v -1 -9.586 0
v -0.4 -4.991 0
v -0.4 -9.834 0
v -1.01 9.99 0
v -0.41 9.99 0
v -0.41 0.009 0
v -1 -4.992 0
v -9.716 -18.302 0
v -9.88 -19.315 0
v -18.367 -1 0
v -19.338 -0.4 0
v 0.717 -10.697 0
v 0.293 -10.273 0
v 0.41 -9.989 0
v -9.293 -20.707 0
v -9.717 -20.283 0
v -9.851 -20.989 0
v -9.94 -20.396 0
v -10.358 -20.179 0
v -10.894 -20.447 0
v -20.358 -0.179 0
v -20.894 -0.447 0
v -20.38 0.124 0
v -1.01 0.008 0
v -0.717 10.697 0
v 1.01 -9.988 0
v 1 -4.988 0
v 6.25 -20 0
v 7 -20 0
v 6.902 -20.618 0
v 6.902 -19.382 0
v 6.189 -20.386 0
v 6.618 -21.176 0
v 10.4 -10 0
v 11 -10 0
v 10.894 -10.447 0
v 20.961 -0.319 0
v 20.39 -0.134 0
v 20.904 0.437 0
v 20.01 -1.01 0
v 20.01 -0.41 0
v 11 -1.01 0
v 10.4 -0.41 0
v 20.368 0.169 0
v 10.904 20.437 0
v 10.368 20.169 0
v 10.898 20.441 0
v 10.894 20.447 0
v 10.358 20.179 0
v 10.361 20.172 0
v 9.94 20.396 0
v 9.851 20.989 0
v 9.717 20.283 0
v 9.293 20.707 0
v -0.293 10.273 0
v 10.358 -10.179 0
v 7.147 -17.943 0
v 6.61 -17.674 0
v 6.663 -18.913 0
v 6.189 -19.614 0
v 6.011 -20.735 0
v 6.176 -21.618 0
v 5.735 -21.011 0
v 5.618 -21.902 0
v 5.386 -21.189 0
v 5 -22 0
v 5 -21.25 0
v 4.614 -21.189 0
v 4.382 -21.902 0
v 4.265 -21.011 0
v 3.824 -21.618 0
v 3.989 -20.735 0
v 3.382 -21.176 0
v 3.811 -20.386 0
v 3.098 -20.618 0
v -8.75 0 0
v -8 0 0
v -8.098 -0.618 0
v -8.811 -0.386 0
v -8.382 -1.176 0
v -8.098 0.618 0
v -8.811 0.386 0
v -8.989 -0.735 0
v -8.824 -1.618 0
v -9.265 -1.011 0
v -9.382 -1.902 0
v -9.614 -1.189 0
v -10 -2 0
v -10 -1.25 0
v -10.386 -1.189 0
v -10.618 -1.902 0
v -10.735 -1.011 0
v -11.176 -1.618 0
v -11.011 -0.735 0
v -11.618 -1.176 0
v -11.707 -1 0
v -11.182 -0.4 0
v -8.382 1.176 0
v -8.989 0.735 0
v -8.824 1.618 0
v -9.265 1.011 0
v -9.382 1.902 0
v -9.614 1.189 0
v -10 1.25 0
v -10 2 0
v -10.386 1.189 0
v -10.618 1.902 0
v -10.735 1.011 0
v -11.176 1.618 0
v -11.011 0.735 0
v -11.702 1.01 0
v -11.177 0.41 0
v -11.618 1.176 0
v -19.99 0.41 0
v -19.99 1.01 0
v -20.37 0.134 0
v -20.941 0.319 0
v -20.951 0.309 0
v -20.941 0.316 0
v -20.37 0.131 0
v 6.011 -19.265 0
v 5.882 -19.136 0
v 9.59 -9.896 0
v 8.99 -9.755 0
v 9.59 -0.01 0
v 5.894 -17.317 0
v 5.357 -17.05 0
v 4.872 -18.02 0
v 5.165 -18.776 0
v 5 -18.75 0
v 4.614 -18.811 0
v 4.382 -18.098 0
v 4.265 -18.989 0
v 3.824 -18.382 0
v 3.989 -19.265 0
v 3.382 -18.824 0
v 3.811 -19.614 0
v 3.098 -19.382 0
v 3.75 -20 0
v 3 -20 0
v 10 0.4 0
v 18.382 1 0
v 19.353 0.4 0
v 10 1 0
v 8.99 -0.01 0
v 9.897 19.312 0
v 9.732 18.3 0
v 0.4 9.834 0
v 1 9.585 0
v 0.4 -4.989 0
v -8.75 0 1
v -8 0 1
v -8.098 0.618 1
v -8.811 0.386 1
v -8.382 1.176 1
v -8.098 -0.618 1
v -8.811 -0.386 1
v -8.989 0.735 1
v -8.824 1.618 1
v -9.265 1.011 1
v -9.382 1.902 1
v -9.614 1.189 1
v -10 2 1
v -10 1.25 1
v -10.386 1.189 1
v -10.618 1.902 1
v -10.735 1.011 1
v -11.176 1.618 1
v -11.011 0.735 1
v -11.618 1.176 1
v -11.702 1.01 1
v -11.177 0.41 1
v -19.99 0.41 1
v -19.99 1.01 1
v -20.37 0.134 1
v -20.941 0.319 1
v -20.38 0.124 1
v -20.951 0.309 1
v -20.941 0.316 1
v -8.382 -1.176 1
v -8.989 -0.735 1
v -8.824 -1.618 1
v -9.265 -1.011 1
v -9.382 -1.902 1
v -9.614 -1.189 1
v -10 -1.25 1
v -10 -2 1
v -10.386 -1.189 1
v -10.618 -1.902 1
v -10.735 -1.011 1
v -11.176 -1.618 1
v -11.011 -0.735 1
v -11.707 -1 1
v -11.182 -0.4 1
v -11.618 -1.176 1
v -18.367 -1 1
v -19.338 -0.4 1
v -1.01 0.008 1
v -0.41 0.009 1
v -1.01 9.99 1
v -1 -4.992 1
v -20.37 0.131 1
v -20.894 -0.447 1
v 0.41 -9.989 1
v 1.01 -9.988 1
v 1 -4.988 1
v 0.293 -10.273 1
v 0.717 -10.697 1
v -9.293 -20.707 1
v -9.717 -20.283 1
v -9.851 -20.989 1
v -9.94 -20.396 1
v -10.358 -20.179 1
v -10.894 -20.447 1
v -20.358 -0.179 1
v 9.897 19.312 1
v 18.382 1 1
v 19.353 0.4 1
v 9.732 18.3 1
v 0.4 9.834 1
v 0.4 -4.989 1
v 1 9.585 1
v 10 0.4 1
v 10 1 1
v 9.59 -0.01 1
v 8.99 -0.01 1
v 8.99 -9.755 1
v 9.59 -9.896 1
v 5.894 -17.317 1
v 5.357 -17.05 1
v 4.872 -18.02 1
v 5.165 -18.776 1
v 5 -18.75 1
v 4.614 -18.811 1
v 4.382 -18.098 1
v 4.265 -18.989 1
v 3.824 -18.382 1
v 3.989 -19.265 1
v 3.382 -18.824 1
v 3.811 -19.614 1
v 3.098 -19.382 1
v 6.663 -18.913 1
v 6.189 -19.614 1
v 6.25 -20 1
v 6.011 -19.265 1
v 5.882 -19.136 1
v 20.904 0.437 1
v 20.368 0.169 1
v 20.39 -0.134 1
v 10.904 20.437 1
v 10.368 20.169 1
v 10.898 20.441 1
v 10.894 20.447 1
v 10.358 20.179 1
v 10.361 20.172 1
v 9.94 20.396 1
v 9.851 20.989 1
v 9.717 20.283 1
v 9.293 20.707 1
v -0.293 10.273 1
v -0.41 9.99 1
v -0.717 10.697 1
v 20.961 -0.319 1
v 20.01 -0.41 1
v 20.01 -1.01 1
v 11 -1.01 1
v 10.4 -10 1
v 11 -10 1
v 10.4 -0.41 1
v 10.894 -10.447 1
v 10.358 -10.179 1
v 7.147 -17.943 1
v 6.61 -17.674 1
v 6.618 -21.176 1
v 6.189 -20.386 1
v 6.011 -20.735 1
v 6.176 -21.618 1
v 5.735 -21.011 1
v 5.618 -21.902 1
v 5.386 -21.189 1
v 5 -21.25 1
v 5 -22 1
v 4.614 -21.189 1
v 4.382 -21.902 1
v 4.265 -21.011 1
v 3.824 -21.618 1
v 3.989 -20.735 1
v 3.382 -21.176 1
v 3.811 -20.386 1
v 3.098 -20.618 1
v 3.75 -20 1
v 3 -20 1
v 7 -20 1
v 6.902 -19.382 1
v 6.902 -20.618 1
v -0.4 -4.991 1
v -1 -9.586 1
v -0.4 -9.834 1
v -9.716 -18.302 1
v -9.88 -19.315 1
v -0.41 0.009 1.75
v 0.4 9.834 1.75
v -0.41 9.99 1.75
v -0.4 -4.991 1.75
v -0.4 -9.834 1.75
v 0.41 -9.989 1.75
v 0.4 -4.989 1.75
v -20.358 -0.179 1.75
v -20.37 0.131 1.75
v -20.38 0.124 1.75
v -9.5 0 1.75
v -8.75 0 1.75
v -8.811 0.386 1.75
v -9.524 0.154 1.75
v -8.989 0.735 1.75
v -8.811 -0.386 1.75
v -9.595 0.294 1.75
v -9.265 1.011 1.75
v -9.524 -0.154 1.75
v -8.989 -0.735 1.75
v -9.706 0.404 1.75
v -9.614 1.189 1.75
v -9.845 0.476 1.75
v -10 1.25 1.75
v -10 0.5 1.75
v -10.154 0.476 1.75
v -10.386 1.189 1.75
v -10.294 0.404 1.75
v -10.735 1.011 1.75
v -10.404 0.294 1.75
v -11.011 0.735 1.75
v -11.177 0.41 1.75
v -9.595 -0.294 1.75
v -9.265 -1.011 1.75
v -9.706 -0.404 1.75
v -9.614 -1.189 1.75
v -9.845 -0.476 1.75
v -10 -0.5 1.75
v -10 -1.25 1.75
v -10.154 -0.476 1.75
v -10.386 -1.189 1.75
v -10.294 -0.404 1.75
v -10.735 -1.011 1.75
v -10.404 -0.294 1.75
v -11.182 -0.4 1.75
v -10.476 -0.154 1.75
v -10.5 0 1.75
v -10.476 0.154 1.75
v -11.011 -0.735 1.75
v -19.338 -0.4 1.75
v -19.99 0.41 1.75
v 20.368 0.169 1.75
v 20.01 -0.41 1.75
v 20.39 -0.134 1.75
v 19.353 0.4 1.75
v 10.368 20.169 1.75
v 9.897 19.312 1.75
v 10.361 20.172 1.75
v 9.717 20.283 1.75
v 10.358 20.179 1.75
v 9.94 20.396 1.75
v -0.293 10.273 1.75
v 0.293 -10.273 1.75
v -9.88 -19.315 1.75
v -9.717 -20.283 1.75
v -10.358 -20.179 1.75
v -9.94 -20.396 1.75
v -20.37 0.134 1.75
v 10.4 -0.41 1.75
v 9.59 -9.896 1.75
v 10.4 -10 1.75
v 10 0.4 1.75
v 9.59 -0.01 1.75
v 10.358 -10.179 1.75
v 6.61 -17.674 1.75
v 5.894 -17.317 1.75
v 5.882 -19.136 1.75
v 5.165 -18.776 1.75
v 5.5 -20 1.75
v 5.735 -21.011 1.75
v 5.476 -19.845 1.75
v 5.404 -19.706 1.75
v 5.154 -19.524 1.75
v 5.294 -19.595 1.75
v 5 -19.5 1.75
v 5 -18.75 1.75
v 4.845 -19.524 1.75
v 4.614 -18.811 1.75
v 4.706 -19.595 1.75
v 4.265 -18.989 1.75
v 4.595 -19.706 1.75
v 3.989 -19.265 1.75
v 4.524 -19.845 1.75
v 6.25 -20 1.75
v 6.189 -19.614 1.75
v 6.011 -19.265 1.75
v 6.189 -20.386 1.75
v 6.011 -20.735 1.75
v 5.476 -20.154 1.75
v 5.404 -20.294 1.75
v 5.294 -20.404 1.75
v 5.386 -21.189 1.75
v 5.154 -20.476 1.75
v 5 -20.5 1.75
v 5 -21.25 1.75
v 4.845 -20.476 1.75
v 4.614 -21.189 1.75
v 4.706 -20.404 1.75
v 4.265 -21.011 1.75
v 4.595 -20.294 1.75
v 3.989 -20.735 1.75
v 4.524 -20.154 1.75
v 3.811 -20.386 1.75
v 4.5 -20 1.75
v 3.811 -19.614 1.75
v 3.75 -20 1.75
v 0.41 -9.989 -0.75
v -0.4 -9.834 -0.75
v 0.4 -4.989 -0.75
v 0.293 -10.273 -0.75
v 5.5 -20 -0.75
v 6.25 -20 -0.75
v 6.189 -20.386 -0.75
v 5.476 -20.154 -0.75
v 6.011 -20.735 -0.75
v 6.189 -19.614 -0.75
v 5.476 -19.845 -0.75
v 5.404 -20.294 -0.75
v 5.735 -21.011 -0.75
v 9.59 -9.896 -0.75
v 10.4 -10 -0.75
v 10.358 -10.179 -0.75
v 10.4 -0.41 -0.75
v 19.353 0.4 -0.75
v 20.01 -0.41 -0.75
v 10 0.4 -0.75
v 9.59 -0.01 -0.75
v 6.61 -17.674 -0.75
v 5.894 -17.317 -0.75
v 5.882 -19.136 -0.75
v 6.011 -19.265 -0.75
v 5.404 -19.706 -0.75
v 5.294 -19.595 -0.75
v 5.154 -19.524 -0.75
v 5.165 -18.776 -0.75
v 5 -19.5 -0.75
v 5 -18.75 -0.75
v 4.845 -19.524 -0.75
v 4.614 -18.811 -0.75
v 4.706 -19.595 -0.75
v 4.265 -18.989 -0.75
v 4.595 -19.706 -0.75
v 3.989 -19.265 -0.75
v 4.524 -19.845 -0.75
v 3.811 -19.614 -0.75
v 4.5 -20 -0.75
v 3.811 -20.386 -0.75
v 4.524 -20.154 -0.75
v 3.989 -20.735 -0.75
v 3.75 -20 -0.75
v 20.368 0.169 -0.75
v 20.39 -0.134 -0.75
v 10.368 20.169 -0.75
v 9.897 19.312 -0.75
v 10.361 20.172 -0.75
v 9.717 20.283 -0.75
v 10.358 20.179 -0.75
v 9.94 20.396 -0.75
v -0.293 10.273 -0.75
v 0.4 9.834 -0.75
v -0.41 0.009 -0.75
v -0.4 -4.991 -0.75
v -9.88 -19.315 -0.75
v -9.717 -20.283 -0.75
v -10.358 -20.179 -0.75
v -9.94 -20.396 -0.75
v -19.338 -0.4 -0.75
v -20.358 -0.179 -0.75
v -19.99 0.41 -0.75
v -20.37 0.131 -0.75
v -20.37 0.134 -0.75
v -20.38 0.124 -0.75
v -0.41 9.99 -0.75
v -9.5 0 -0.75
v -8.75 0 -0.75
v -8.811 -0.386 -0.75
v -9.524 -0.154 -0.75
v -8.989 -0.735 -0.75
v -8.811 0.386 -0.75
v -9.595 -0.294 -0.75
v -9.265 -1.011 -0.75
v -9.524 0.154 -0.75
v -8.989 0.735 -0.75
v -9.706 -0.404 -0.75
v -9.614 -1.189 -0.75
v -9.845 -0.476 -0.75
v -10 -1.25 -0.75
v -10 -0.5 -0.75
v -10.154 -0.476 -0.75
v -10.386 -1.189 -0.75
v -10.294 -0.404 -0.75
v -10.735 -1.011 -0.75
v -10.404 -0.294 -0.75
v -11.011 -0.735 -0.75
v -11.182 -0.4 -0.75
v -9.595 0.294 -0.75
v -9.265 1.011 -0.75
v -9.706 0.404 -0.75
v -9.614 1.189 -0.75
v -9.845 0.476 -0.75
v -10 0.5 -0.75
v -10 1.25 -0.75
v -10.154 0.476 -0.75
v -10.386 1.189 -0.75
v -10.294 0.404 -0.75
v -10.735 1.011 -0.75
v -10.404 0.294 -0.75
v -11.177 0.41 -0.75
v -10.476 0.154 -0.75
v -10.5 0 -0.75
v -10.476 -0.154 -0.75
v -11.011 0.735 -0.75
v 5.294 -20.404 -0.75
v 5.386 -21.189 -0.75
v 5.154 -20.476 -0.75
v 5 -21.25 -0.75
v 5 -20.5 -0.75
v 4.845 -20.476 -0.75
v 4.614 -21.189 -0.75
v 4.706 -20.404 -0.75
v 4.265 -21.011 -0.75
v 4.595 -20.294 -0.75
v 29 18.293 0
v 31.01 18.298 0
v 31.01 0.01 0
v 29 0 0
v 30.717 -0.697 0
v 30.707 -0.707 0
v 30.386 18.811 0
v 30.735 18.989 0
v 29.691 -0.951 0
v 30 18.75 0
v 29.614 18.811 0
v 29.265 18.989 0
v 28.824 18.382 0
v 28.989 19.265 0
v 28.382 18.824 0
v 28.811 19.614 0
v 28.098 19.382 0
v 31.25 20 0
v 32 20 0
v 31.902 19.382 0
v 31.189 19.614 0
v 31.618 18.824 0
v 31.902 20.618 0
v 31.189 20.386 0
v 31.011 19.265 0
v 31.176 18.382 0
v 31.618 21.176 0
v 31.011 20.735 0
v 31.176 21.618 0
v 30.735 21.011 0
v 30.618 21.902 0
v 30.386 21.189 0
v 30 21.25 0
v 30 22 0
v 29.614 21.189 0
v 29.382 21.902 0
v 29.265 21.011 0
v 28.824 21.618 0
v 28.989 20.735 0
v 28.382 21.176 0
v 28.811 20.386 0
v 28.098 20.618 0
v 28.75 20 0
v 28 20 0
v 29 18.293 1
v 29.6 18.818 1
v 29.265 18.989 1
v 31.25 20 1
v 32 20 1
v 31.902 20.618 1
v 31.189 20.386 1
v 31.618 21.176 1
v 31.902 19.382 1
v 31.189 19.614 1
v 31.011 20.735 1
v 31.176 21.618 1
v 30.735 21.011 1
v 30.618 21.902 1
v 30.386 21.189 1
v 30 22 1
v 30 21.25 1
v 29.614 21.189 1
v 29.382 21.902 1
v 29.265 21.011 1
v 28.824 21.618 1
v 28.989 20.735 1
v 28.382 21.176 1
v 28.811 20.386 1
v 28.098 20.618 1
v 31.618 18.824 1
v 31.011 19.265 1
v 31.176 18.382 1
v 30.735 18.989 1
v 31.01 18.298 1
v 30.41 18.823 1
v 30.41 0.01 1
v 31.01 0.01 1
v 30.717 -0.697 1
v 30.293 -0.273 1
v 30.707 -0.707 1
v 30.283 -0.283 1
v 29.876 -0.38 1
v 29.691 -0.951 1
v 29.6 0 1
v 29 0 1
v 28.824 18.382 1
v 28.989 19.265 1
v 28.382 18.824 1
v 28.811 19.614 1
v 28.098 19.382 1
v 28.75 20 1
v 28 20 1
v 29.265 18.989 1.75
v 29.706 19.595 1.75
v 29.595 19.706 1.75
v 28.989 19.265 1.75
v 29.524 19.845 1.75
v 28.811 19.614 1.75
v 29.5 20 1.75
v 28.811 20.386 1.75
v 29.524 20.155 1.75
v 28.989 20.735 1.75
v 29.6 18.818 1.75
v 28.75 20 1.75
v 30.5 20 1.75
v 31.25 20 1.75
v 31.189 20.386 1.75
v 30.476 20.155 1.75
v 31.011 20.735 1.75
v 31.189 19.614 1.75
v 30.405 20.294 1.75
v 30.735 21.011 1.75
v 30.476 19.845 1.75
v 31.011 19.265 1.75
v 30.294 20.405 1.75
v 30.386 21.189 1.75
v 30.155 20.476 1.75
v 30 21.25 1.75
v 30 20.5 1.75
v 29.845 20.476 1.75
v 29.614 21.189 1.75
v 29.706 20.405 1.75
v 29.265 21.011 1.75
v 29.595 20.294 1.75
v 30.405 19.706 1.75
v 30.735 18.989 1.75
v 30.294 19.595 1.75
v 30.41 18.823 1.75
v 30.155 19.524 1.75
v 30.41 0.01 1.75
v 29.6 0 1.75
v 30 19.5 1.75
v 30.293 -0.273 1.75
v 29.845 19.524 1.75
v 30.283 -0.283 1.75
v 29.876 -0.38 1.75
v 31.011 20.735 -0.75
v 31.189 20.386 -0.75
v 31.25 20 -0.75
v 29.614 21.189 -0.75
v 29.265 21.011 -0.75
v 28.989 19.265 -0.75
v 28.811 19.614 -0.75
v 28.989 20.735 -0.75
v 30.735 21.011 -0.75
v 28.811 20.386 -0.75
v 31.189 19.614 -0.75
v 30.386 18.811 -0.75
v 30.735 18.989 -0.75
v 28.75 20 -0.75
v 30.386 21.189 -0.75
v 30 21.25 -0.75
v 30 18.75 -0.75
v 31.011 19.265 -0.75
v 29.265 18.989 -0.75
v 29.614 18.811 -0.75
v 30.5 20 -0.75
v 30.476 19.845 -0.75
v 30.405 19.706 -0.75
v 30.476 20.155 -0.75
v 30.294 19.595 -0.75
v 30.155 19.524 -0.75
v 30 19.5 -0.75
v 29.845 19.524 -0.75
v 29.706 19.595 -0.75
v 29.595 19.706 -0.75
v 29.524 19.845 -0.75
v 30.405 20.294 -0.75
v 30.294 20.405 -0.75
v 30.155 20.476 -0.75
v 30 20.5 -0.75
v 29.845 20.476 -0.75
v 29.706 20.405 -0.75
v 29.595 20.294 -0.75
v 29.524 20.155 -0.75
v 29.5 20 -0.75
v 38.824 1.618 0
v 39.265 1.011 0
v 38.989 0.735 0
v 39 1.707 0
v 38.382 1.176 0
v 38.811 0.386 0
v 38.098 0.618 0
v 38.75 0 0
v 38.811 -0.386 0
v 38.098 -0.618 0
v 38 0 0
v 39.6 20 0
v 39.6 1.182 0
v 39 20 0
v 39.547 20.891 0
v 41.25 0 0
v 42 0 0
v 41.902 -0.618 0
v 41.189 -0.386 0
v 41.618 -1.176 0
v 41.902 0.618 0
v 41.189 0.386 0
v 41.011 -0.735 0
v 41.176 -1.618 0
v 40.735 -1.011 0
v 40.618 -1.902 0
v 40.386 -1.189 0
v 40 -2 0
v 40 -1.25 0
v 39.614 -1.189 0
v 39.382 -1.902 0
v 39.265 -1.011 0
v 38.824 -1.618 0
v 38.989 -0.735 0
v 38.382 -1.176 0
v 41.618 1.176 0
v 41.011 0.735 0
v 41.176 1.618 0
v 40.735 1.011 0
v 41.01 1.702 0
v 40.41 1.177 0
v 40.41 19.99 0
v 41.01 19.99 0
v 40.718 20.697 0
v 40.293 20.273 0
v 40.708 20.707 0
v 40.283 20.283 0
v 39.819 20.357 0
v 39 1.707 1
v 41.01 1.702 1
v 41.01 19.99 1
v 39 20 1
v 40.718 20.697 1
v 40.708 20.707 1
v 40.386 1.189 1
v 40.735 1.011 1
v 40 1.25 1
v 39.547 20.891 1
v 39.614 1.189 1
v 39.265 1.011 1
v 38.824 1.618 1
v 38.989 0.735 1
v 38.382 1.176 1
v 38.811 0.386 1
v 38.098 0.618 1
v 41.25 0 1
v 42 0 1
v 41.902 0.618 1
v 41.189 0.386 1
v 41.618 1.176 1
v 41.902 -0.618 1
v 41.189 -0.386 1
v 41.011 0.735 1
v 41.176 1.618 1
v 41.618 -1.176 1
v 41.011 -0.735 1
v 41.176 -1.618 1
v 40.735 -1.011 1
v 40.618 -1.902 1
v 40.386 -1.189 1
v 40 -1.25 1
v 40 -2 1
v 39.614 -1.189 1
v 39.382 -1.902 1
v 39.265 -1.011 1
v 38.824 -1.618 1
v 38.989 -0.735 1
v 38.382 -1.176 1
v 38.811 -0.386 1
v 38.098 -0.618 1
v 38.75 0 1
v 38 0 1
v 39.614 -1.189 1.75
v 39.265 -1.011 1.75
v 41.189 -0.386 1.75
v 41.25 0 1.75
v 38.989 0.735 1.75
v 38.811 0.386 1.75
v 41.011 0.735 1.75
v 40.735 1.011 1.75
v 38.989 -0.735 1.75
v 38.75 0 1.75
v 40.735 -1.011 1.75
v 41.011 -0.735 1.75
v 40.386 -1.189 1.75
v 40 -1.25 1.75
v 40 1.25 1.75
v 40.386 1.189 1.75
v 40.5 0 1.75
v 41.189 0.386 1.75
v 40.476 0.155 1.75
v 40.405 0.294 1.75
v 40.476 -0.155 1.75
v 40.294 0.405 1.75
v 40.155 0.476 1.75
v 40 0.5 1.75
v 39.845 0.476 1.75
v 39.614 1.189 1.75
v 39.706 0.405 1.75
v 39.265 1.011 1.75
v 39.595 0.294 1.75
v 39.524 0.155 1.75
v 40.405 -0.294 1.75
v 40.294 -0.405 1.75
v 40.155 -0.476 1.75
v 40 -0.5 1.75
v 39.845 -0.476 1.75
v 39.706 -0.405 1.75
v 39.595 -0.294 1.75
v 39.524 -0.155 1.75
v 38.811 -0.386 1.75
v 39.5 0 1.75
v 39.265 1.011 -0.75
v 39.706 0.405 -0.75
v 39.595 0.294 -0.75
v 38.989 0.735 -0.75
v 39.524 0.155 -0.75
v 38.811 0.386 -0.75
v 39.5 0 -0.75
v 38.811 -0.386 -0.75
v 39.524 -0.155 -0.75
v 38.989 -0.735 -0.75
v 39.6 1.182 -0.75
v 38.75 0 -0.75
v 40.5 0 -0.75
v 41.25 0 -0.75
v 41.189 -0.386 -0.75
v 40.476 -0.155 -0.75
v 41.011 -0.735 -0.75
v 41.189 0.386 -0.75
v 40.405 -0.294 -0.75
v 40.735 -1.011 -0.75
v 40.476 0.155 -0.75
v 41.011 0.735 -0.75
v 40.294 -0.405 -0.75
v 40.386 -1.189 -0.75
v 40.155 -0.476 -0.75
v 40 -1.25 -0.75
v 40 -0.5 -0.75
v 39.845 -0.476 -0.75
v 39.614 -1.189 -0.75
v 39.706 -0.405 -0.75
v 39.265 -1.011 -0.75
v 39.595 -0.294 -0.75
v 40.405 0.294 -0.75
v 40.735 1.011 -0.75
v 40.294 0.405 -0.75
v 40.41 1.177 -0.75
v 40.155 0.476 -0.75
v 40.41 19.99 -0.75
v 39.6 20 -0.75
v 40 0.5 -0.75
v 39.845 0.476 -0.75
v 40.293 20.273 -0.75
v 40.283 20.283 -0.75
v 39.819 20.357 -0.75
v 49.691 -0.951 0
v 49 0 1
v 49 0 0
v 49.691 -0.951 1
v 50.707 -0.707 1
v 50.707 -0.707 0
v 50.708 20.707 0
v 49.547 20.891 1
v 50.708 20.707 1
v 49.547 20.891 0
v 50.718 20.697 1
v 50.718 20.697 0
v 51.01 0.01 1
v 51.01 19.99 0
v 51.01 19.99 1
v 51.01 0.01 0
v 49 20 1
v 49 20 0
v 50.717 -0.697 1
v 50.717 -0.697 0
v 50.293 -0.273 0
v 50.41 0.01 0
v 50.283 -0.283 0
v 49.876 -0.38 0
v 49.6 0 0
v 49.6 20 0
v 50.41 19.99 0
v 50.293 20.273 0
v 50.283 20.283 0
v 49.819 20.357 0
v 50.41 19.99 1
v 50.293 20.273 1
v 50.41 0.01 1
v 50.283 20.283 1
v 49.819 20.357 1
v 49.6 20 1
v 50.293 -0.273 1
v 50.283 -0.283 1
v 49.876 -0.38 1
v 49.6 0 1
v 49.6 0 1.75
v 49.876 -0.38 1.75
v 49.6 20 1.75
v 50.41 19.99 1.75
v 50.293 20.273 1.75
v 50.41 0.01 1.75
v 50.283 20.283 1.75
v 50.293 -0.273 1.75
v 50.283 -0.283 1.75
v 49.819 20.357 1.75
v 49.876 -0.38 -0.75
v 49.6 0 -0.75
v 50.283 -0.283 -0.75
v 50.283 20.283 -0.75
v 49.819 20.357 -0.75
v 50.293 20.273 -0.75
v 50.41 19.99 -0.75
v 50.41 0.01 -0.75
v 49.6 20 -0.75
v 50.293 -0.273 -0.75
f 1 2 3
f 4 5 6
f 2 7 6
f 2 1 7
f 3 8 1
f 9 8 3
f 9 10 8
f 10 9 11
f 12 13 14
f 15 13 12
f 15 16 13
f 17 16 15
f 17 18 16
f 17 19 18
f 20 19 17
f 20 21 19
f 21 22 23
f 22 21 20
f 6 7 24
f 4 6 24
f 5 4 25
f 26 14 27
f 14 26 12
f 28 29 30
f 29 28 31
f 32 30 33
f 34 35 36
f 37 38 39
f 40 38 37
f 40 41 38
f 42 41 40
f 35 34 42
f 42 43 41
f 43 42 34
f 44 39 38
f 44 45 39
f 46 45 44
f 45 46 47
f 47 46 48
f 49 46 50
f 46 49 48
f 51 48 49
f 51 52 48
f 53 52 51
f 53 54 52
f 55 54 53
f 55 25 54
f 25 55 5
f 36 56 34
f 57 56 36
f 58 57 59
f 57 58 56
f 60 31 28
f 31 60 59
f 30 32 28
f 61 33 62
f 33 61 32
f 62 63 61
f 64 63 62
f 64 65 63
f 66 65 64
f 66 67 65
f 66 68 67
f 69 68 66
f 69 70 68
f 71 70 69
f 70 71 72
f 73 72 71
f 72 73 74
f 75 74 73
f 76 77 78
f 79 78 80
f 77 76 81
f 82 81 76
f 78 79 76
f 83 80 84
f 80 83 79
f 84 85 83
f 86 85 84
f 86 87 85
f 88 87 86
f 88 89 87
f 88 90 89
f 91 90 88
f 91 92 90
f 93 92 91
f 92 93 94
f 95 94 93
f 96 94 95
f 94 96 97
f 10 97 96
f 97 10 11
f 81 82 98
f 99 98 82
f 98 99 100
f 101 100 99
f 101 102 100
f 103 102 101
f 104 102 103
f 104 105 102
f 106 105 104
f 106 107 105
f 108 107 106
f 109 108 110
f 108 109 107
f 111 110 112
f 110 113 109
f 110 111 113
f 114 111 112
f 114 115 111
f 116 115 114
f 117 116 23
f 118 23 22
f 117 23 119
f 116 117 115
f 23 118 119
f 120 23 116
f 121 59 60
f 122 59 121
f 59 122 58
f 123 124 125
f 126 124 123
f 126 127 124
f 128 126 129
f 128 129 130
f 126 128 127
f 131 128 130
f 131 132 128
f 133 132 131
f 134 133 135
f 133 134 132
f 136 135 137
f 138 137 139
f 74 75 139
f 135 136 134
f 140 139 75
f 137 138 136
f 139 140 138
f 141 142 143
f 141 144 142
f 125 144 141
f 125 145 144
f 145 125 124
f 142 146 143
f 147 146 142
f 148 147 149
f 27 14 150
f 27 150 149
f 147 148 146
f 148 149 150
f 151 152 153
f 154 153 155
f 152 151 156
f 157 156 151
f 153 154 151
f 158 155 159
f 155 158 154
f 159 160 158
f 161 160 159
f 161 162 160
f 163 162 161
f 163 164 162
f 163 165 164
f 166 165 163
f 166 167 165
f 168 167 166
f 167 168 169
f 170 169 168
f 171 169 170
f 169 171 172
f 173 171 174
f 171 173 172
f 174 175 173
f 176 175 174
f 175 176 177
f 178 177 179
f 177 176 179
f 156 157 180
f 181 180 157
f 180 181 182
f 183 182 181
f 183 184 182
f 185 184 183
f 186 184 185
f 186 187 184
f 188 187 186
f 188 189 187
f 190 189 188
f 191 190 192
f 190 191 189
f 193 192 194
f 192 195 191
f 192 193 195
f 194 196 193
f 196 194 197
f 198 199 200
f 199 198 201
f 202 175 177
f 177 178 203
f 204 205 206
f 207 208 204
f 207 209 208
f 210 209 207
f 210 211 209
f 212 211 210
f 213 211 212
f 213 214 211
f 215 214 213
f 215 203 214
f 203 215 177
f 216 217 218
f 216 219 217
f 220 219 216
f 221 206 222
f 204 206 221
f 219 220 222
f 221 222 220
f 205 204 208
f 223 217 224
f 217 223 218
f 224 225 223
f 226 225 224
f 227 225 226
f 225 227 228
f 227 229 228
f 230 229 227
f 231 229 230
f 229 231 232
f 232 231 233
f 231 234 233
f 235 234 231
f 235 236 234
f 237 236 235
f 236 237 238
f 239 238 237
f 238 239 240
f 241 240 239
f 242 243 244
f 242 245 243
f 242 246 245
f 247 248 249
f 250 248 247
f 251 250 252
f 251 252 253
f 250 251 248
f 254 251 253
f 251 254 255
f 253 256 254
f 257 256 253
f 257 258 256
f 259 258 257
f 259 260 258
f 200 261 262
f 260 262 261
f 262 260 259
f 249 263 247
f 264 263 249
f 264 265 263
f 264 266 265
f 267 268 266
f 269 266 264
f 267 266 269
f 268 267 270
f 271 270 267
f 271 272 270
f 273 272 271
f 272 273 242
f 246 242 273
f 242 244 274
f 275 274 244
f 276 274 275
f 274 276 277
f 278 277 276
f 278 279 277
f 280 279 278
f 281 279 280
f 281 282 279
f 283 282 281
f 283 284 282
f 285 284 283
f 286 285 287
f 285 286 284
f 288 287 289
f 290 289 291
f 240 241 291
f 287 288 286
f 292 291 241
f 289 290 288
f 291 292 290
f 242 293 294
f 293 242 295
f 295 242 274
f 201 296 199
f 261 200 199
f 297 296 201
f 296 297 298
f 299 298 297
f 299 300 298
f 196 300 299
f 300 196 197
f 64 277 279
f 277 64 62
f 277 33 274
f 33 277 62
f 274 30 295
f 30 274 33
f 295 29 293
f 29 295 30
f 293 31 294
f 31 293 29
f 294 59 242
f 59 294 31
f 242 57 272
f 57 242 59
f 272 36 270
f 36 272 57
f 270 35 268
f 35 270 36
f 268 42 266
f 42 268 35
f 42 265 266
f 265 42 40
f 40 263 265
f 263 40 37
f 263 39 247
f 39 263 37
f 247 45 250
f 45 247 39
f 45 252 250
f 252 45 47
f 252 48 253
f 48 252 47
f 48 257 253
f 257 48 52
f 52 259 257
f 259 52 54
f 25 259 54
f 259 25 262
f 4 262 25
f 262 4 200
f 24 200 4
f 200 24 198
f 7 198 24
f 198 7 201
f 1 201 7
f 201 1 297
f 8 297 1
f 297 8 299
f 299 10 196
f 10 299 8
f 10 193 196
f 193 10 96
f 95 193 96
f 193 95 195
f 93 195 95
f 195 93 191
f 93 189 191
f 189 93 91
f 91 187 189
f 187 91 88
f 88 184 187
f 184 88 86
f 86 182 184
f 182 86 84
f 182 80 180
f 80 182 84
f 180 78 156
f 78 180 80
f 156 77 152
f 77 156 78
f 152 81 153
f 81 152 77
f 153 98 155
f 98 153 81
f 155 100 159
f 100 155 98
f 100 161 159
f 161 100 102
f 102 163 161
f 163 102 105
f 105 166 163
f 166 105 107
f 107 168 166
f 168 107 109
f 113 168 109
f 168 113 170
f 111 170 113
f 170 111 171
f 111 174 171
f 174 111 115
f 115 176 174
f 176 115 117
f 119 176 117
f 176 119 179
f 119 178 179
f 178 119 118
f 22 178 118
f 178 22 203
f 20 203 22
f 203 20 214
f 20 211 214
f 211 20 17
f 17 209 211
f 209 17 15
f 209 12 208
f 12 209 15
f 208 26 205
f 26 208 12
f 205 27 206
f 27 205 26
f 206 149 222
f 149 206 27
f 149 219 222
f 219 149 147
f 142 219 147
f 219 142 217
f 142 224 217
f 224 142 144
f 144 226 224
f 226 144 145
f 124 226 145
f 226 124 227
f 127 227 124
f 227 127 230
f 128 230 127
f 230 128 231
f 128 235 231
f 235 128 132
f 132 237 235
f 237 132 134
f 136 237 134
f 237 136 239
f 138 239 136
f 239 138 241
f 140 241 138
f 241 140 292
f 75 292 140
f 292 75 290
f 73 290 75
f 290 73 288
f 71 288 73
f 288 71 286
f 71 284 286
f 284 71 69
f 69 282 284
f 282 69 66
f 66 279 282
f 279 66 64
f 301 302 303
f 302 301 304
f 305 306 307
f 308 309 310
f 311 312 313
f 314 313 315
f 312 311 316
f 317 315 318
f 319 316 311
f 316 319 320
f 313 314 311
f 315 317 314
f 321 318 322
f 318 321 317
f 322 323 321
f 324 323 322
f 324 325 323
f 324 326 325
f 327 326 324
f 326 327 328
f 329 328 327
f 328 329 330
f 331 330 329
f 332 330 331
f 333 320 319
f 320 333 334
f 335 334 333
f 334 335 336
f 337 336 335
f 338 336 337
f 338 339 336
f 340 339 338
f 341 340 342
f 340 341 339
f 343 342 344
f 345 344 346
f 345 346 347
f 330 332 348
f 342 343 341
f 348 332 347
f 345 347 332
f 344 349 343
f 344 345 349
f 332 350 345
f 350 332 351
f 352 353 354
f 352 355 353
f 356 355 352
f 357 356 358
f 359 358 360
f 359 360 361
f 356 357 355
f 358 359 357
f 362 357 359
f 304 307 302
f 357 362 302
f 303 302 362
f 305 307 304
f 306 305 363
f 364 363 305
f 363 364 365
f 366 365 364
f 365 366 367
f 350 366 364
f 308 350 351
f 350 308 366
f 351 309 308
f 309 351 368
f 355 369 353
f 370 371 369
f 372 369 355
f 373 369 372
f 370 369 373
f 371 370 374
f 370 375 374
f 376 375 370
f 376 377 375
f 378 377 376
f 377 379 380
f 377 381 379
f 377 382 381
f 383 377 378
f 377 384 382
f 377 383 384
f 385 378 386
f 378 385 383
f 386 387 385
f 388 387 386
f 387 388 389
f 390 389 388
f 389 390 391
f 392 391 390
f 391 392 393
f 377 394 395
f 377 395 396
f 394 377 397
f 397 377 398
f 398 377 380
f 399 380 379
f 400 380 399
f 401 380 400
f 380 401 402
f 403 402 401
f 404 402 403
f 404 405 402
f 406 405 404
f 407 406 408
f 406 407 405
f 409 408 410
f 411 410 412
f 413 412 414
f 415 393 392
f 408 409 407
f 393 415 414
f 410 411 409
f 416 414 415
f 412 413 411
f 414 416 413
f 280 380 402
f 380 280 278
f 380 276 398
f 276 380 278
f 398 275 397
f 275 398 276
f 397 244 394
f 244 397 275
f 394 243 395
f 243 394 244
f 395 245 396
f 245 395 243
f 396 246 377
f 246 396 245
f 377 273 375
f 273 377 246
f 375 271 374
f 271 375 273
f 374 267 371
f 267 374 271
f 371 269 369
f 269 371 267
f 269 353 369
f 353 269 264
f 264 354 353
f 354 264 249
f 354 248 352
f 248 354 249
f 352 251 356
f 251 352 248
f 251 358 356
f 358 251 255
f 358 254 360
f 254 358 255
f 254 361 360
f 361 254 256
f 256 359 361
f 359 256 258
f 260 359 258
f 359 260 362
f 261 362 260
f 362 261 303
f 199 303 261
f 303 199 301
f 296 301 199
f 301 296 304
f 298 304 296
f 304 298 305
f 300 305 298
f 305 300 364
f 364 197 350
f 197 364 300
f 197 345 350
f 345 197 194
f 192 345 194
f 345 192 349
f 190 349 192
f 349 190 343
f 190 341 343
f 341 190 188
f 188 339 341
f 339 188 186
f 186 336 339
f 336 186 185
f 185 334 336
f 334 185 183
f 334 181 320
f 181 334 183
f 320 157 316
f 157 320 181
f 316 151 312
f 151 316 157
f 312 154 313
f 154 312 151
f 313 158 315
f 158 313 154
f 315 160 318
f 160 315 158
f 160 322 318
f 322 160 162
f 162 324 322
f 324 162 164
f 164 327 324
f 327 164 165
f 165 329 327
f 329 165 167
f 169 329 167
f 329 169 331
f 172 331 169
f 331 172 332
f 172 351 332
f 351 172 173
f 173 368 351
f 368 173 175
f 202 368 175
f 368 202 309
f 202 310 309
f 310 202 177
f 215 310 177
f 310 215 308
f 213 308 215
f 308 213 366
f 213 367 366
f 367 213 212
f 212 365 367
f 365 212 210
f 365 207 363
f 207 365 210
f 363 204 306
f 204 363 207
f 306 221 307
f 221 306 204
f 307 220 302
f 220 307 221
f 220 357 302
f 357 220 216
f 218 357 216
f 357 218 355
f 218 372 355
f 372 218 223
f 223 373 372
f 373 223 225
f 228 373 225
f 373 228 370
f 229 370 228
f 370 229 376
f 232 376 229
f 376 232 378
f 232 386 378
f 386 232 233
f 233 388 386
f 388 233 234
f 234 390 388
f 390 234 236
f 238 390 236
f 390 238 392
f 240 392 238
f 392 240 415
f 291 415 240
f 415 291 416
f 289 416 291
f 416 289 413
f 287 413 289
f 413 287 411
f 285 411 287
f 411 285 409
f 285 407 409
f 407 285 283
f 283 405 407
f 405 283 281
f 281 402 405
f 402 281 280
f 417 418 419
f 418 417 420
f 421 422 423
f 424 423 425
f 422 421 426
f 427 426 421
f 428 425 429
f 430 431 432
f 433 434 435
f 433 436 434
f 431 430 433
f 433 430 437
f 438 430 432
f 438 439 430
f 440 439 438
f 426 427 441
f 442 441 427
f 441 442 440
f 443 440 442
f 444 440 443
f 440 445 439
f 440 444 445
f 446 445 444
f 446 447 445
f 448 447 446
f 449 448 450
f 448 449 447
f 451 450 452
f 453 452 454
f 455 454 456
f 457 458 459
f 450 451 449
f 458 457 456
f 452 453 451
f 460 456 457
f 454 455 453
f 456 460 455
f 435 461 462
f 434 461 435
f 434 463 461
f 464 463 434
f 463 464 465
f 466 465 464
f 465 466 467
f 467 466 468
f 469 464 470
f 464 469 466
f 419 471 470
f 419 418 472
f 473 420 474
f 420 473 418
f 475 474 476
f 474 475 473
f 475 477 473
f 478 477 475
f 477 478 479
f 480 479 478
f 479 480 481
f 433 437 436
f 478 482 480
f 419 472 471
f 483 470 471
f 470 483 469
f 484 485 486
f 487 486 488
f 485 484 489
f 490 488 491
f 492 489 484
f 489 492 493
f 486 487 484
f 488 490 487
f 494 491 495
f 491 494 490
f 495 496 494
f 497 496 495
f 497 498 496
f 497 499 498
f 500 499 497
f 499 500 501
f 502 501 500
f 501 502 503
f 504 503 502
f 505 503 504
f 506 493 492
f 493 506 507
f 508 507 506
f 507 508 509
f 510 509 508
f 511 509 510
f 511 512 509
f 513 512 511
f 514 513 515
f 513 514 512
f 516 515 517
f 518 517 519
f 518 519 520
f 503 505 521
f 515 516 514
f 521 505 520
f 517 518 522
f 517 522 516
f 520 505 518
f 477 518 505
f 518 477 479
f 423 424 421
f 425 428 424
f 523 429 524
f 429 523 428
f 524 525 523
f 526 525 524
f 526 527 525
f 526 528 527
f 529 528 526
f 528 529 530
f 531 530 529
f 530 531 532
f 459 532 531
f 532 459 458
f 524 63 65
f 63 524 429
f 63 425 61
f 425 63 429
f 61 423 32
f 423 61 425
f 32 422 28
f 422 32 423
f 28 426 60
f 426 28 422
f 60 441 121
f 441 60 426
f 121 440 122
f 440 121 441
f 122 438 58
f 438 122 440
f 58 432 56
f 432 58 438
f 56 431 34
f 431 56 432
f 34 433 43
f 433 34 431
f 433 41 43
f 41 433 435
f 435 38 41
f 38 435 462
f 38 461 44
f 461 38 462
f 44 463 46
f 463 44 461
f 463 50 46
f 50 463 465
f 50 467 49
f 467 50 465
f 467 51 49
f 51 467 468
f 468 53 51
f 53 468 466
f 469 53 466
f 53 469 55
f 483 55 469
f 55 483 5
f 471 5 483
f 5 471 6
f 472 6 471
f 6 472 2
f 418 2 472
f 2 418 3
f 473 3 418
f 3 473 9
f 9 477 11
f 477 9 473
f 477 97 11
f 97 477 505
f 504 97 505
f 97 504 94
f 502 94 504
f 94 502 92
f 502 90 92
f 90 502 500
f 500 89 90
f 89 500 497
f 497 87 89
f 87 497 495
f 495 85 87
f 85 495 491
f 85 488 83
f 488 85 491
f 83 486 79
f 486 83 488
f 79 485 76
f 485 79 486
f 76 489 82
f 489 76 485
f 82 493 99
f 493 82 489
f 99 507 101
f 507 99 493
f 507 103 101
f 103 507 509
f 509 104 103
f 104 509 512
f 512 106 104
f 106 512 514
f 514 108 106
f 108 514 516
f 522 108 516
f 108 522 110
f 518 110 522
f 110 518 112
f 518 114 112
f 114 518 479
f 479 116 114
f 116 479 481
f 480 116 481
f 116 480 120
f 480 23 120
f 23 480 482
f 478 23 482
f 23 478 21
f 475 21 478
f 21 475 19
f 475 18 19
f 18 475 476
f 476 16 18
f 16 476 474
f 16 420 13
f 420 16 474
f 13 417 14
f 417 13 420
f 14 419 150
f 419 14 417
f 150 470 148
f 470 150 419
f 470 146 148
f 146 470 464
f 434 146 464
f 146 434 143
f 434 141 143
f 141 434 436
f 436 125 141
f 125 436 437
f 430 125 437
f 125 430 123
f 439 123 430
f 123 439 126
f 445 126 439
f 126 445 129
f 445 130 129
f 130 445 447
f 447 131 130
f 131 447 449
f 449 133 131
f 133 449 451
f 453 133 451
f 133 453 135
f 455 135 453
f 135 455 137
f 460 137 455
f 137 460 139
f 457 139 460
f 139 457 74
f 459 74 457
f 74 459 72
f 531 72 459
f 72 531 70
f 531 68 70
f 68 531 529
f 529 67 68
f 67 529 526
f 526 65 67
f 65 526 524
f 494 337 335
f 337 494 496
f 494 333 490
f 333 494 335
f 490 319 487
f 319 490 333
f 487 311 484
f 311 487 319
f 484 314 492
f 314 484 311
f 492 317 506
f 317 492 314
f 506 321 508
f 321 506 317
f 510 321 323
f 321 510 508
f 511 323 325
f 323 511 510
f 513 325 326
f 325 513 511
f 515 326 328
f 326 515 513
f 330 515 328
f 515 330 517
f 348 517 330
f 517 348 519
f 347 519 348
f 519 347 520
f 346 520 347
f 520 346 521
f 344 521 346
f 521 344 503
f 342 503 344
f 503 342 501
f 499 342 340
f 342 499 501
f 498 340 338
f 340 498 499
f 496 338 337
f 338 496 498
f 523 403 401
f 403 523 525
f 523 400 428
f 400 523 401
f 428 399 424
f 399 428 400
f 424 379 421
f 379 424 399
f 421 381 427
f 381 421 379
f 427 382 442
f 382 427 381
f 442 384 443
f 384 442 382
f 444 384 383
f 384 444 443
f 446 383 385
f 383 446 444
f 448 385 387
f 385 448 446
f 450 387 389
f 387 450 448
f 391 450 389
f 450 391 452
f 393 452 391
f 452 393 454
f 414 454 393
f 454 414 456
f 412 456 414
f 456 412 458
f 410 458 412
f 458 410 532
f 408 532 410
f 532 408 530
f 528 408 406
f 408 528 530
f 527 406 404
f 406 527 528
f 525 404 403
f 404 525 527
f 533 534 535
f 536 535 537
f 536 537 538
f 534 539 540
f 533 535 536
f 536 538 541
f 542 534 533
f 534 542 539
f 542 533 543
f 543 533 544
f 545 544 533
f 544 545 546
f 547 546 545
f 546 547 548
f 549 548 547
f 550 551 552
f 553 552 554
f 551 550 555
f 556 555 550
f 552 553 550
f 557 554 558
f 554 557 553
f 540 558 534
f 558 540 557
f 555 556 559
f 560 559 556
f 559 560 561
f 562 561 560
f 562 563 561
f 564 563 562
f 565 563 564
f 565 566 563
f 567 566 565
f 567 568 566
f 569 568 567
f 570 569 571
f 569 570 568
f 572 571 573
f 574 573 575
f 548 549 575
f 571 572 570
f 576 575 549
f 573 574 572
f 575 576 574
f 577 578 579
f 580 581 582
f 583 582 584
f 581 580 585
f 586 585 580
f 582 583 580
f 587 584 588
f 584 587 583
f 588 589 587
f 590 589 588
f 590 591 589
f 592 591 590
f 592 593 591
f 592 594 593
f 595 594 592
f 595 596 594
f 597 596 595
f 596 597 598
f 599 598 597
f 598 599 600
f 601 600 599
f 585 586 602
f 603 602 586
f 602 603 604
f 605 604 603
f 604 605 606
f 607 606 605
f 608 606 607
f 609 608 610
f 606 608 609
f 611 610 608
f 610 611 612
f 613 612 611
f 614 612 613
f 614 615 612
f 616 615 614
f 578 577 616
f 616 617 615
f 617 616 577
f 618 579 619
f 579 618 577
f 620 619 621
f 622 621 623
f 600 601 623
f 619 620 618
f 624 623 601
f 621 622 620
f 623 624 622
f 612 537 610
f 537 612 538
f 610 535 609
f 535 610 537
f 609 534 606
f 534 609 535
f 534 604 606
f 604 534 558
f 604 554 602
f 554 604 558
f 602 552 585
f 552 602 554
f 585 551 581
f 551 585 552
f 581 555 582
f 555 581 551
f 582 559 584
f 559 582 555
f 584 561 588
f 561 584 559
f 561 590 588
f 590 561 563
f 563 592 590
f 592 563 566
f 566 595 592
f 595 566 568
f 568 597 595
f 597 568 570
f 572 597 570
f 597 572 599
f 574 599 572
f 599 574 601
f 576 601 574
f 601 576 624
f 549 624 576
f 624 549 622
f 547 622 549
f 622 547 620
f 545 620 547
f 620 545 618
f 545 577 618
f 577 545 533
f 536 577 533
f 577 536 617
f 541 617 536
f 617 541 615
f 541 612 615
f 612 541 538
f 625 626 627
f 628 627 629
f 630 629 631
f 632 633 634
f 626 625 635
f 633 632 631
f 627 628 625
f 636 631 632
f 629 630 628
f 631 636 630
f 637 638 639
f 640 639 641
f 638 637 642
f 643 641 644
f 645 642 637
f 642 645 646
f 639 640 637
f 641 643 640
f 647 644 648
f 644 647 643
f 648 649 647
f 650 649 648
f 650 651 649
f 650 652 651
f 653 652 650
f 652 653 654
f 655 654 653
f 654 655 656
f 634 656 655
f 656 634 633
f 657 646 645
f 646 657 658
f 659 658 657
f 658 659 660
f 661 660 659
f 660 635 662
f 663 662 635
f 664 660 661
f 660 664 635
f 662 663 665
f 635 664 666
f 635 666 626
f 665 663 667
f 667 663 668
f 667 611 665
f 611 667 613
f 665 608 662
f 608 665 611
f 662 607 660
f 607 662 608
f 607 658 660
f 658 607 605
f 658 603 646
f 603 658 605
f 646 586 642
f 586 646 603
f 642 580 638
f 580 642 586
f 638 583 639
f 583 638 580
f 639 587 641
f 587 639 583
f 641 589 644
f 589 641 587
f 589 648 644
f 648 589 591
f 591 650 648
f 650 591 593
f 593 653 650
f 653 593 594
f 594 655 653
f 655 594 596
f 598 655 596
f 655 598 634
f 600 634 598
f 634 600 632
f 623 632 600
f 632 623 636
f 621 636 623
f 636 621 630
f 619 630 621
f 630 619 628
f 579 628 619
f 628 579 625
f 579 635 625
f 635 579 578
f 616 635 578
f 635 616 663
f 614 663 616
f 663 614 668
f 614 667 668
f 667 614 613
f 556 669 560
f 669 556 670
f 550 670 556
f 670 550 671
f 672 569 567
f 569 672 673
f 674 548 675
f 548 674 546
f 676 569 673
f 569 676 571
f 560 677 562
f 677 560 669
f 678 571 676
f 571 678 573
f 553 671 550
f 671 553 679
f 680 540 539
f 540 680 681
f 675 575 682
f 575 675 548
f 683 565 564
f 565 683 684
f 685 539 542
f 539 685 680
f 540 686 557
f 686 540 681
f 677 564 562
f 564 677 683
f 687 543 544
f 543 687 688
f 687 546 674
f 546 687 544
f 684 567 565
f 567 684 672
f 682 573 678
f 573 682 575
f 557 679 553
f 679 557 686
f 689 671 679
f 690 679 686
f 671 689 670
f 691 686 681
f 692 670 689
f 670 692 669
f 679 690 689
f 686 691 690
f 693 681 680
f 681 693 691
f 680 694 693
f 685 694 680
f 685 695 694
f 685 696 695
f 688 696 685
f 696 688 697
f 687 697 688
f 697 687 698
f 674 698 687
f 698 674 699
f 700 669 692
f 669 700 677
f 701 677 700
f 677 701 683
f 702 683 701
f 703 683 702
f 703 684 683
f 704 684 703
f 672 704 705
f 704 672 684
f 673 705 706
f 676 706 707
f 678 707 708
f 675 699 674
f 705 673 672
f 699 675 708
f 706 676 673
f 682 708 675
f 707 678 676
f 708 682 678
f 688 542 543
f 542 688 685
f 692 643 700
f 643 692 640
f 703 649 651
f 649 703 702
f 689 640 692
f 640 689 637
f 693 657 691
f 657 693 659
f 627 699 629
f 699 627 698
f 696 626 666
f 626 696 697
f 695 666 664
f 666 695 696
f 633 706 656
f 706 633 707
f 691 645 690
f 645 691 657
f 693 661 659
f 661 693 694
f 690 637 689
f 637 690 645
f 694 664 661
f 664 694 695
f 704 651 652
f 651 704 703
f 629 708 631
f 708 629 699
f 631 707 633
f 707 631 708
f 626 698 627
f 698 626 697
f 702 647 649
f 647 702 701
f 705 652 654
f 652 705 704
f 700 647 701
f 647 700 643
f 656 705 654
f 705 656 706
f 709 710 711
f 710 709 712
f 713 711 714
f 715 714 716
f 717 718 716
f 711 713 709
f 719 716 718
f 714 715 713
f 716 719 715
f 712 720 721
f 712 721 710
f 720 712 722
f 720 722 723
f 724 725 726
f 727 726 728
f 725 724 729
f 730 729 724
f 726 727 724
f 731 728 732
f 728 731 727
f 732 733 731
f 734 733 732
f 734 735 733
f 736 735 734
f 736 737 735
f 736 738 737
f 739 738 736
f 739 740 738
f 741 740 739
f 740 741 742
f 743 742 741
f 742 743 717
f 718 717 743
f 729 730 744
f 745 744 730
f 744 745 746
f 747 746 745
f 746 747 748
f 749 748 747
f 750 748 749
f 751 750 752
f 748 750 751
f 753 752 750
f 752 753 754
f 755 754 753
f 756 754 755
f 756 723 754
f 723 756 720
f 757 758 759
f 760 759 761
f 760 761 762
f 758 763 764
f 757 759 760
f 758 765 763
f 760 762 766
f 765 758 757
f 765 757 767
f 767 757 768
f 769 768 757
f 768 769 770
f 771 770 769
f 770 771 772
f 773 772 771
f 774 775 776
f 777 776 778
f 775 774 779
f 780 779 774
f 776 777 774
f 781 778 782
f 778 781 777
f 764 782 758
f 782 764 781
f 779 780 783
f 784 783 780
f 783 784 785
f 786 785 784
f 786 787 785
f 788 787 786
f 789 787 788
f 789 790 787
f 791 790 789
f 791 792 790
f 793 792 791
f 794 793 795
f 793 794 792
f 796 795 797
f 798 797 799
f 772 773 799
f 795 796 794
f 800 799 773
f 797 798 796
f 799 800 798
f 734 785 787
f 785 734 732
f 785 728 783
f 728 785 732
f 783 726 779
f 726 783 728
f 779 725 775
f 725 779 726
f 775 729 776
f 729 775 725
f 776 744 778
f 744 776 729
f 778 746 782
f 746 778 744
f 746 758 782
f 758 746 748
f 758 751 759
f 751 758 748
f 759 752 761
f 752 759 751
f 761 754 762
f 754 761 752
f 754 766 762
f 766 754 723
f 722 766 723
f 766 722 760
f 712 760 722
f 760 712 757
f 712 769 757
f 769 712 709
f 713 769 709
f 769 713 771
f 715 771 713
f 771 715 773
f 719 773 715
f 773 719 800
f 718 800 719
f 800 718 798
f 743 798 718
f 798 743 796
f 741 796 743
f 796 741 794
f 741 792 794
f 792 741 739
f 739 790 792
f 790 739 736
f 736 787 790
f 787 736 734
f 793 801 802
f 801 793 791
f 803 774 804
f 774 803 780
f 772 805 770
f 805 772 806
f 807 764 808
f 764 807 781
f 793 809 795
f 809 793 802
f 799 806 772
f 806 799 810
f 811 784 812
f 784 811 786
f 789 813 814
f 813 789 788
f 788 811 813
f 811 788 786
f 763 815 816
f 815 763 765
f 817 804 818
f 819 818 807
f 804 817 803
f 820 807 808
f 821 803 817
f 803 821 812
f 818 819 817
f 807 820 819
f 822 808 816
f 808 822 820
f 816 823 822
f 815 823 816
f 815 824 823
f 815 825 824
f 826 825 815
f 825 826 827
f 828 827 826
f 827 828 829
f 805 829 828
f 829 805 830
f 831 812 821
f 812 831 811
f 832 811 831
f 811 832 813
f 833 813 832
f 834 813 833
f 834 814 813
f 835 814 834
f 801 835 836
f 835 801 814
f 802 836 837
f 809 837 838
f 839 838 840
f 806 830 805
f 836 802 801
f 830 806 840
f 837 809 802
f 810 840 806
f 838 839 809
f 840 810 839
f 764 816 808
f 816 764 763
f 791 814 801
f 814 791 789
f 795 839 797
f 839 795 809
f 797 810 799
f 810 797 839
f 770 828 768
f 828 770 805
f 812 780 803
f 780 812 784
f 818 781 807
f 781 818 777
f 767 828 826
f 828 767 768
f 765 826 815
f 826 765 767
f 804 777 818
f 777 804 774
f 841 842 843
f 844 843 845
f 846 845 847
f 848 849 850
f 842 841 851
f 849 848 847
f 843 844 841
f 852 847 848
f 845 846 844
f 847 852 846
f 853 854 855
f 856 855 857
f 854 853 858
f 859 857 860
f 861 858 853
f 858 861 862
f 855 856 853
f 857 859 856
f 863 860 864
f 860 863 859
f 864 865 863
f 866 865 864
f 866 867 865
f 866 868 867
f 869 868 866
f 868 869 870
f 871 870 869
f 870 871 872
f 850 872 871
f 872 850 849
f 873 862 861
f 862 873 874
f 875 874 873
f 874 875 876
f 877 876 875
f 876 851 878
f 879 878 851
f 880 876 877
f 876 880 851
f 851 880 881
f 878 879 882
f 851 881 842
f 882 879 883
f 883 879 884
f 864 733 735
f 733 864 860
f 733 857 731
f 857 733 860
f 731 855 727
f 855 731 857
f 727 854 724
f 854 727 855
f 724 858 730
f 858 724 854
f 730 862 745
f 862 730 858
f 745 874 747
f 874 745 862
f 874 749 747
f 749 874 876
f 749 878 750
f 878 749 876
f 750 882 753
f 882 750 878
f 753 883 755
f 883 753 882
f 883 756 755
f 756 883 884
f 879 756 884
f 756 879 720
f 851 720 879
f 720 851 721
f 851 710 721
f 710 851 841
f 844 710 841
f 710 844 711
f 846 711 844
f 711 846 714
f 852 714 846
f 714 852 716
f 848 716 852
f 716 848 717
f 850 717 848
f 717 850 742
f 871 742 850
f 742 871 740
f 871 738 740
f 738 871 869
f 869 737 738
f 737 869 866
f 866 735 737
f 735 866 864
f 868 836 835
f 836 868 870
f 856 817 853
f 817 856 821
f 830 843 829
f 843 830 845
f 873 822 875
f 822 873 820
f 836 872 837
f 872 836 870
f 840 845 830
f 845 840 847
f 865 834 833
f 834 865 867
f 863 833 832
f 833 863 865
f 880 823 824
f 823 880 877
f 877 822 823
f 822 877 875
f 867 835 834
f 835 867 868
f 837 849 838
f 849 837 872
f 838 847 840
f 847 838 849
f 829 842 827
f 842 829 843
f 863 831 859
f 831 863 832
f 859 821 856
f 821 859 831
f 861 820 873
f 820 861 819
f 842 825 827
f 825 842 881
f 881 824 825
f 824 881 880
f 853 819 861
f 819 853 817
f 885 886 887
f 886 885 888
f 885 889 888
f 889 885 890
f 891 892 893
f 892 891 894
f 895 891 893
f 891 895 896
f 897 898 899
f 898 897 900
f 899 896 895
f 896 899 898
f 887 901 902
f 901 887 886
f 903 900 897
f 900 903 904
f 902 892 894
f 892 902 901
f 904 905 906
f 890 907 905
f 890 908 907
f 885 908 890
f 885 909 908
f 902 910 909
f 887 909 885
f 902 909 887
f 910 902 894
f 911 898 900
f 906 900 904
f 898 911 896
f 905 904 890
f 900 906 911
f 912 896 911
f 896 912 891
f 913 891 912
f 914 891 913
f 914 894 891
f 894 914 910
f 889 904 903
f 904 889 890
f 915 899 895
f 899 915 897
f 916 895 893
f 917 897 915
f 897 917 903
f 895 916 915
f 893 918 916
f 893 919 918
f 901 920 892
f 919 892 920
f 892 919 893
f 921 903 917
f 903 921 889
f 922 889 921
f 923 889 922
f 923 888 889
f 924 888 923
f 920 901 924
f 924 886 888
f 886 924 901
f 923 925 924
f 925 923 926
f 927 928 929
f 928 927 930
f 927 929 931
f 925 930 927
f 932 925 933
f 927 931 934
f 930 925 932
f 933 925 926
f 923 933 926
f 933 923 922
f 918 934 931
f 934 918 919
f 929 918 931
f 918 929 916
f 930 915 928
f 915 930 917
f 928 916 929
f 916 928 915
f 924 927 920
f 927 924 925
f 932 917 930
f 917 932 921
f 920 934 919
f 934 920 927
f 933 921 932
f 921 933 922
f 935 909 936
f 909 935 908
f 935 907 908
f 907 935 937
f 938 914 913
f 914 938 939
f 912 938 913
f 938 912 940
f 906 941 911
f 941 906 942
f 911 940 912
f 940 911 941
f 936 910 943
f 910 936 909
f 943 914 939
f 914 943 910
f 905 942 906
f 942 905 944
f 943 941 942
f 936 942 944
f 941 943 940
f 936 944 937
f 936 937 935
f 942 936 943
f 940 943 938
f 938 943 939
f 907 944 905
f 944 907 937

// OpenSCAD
// file: ../../../lib/circuits/trace.scad
function vdef(vector, index) = len(vector) == index ? vector[index-1] : vector[index];
function vadd(vector, index, axis) = vdef(vector, index)[axis] > vdef(vector, index-1)[axis] ? 0.01 : -0.01;
function polygon_from_vector(vector) = 
  len(vector) > 0 ?
    concat(vector, 
      [for (i = [1:len(vector)]) 
        [vector[len(vector)-i][0]-vadd(vector, i, 0),vector[len(vector)-i][1]-vadd(vector, i, 1)]])
      : [];

function parse_loc(loc) = [
  loc[5],
  len(loc) < 7 ? "both" : loc[6],
  len(loc) < 8 ? "none" : loc[7],
];

module manual_trace_pcb_drill(location) {
  vector = parse_loc(location)[0];
  echo("holes", parse_loc(location)[2]);
  if(parse_loc(location)[2] == "holes" || parse_loc(location)[2] == "hole_begin") {
    translate(vector[0]) {
      circle(d=1, $fn=20);
    }
  }
  if(parse_loc(location)[2] == "holes" || parse_loc(location)[2] == "hole_end") {
    translate(vector[len(vector)-1]) {
      circle(d=1, $fn=20);
    }
  }
}

module manual_trace_pcb_traces(location) {
  vector = parse_loc(location)[0];
  if(parse_loc(location)[1] != "bottom") {
    offset(0.4) {
      polygon(points=polygon_from_vector(vector));
    }
  }
  if(parse_loc(location)[2] == "holes" || parse_loc(location)[2] == "hole_begin") {
    translate(vector[0]) {
      circle(d=2.5, $fn=20);
    }
  }
  if(parse_loc(location)[2] == "holes" || parse_loc(location)[2] == "hole_end") {
    translate(vector[len(vector)-1]) {
      circle(d=2.5, $fn=20);
    }
  }
}

module manual_trace_pcb_traces_bottom(location) {
  vector = parse_loc(location)[0];
  if(parse_loc(location)[1] != "top") {
    offset(0.4) {
      polygon(points=polygon_from_vector(vector));
    }
  }
  if(parse_loc(location)[2] == "holes" || parse_loc(location)[2] == "hole_begin") {
    translate(vector[0]) {
      circle(d=2.5, $fn=20);
    }
  }
  if(parse_loc(location)[2] == "holes" || parse_loc(location)[2] == "hole_end") {
    translate(vector[len(vector)-1]) {
      circle(d=2.5, $fn=20);
    }
  }
}

module manual_trace_pcb_outline(location) {
  vector = parse_loc(location)[0];
  echo("location", location);
  offset(1)
    polygon(points=polygon_from_vector(vector));

  if(parse_loc(location)[2] == "holes" || parse_loc(location)[2] == "hole_begin") {
    translate(vector[0]) {
      circle(d=4, $fn=20);
    }
  }
  if(parse_loc(location)[2] == "holes" || parse_loc(location)[2] == "hole_end") {
    translate(vector[len(vector)-1]) {
      circle(d=4, $fn=20);
    }
  }
}

module manual_trace_space_outline(location) {
  vector = parse_loc(location)[0];
  translate([0,0,-1])
    linear_extrude(2)
      offset(0.5)
        manual_trace_pcb_outline(vector);
}
// main file
use <../../../lib/circuits/trace.scad>

module manual_trace_test(location){
  difference(){
    union(){
      color("blue")
        linear_extrude(1)
          manual_trace_pcb_outline(location);
      color("red")
        translate([0,0,0.75])
          linear_extrude(1)
            manual_trace_pcb_traces(location);
      color("orange")
        translate([0,0,-0.75])
          linear_extrude(1)
            manual_trace_pcb_traces_bottom(location);
    }
    translate([0,0,-1])
      linear_extrude(3)
        manual_trace_pcb_drill(location);
  }
}

manual_trace_test([0,0,0,0,"",[[-10,0],[-20,0],[-10,-20],[0,-10],[0,0],[0,10],[10,20],[20,0],[10,0],[10,-10],[5,-20]],"both","holes"]);

translate([30,0])
  manual_trace_test([0,0,0,0,"",[[0,0],[0,20]],"top","hole_end"]);
translate([40,0])
  manual_trace_test([0,0,0,0,"",[[0,0],[0,20]],"bottom","hole_begin"]);
translate([50,0])
  manual_trace_test([0,0,0,0,"",[[0,0],[0,20]],"both","none"]);
